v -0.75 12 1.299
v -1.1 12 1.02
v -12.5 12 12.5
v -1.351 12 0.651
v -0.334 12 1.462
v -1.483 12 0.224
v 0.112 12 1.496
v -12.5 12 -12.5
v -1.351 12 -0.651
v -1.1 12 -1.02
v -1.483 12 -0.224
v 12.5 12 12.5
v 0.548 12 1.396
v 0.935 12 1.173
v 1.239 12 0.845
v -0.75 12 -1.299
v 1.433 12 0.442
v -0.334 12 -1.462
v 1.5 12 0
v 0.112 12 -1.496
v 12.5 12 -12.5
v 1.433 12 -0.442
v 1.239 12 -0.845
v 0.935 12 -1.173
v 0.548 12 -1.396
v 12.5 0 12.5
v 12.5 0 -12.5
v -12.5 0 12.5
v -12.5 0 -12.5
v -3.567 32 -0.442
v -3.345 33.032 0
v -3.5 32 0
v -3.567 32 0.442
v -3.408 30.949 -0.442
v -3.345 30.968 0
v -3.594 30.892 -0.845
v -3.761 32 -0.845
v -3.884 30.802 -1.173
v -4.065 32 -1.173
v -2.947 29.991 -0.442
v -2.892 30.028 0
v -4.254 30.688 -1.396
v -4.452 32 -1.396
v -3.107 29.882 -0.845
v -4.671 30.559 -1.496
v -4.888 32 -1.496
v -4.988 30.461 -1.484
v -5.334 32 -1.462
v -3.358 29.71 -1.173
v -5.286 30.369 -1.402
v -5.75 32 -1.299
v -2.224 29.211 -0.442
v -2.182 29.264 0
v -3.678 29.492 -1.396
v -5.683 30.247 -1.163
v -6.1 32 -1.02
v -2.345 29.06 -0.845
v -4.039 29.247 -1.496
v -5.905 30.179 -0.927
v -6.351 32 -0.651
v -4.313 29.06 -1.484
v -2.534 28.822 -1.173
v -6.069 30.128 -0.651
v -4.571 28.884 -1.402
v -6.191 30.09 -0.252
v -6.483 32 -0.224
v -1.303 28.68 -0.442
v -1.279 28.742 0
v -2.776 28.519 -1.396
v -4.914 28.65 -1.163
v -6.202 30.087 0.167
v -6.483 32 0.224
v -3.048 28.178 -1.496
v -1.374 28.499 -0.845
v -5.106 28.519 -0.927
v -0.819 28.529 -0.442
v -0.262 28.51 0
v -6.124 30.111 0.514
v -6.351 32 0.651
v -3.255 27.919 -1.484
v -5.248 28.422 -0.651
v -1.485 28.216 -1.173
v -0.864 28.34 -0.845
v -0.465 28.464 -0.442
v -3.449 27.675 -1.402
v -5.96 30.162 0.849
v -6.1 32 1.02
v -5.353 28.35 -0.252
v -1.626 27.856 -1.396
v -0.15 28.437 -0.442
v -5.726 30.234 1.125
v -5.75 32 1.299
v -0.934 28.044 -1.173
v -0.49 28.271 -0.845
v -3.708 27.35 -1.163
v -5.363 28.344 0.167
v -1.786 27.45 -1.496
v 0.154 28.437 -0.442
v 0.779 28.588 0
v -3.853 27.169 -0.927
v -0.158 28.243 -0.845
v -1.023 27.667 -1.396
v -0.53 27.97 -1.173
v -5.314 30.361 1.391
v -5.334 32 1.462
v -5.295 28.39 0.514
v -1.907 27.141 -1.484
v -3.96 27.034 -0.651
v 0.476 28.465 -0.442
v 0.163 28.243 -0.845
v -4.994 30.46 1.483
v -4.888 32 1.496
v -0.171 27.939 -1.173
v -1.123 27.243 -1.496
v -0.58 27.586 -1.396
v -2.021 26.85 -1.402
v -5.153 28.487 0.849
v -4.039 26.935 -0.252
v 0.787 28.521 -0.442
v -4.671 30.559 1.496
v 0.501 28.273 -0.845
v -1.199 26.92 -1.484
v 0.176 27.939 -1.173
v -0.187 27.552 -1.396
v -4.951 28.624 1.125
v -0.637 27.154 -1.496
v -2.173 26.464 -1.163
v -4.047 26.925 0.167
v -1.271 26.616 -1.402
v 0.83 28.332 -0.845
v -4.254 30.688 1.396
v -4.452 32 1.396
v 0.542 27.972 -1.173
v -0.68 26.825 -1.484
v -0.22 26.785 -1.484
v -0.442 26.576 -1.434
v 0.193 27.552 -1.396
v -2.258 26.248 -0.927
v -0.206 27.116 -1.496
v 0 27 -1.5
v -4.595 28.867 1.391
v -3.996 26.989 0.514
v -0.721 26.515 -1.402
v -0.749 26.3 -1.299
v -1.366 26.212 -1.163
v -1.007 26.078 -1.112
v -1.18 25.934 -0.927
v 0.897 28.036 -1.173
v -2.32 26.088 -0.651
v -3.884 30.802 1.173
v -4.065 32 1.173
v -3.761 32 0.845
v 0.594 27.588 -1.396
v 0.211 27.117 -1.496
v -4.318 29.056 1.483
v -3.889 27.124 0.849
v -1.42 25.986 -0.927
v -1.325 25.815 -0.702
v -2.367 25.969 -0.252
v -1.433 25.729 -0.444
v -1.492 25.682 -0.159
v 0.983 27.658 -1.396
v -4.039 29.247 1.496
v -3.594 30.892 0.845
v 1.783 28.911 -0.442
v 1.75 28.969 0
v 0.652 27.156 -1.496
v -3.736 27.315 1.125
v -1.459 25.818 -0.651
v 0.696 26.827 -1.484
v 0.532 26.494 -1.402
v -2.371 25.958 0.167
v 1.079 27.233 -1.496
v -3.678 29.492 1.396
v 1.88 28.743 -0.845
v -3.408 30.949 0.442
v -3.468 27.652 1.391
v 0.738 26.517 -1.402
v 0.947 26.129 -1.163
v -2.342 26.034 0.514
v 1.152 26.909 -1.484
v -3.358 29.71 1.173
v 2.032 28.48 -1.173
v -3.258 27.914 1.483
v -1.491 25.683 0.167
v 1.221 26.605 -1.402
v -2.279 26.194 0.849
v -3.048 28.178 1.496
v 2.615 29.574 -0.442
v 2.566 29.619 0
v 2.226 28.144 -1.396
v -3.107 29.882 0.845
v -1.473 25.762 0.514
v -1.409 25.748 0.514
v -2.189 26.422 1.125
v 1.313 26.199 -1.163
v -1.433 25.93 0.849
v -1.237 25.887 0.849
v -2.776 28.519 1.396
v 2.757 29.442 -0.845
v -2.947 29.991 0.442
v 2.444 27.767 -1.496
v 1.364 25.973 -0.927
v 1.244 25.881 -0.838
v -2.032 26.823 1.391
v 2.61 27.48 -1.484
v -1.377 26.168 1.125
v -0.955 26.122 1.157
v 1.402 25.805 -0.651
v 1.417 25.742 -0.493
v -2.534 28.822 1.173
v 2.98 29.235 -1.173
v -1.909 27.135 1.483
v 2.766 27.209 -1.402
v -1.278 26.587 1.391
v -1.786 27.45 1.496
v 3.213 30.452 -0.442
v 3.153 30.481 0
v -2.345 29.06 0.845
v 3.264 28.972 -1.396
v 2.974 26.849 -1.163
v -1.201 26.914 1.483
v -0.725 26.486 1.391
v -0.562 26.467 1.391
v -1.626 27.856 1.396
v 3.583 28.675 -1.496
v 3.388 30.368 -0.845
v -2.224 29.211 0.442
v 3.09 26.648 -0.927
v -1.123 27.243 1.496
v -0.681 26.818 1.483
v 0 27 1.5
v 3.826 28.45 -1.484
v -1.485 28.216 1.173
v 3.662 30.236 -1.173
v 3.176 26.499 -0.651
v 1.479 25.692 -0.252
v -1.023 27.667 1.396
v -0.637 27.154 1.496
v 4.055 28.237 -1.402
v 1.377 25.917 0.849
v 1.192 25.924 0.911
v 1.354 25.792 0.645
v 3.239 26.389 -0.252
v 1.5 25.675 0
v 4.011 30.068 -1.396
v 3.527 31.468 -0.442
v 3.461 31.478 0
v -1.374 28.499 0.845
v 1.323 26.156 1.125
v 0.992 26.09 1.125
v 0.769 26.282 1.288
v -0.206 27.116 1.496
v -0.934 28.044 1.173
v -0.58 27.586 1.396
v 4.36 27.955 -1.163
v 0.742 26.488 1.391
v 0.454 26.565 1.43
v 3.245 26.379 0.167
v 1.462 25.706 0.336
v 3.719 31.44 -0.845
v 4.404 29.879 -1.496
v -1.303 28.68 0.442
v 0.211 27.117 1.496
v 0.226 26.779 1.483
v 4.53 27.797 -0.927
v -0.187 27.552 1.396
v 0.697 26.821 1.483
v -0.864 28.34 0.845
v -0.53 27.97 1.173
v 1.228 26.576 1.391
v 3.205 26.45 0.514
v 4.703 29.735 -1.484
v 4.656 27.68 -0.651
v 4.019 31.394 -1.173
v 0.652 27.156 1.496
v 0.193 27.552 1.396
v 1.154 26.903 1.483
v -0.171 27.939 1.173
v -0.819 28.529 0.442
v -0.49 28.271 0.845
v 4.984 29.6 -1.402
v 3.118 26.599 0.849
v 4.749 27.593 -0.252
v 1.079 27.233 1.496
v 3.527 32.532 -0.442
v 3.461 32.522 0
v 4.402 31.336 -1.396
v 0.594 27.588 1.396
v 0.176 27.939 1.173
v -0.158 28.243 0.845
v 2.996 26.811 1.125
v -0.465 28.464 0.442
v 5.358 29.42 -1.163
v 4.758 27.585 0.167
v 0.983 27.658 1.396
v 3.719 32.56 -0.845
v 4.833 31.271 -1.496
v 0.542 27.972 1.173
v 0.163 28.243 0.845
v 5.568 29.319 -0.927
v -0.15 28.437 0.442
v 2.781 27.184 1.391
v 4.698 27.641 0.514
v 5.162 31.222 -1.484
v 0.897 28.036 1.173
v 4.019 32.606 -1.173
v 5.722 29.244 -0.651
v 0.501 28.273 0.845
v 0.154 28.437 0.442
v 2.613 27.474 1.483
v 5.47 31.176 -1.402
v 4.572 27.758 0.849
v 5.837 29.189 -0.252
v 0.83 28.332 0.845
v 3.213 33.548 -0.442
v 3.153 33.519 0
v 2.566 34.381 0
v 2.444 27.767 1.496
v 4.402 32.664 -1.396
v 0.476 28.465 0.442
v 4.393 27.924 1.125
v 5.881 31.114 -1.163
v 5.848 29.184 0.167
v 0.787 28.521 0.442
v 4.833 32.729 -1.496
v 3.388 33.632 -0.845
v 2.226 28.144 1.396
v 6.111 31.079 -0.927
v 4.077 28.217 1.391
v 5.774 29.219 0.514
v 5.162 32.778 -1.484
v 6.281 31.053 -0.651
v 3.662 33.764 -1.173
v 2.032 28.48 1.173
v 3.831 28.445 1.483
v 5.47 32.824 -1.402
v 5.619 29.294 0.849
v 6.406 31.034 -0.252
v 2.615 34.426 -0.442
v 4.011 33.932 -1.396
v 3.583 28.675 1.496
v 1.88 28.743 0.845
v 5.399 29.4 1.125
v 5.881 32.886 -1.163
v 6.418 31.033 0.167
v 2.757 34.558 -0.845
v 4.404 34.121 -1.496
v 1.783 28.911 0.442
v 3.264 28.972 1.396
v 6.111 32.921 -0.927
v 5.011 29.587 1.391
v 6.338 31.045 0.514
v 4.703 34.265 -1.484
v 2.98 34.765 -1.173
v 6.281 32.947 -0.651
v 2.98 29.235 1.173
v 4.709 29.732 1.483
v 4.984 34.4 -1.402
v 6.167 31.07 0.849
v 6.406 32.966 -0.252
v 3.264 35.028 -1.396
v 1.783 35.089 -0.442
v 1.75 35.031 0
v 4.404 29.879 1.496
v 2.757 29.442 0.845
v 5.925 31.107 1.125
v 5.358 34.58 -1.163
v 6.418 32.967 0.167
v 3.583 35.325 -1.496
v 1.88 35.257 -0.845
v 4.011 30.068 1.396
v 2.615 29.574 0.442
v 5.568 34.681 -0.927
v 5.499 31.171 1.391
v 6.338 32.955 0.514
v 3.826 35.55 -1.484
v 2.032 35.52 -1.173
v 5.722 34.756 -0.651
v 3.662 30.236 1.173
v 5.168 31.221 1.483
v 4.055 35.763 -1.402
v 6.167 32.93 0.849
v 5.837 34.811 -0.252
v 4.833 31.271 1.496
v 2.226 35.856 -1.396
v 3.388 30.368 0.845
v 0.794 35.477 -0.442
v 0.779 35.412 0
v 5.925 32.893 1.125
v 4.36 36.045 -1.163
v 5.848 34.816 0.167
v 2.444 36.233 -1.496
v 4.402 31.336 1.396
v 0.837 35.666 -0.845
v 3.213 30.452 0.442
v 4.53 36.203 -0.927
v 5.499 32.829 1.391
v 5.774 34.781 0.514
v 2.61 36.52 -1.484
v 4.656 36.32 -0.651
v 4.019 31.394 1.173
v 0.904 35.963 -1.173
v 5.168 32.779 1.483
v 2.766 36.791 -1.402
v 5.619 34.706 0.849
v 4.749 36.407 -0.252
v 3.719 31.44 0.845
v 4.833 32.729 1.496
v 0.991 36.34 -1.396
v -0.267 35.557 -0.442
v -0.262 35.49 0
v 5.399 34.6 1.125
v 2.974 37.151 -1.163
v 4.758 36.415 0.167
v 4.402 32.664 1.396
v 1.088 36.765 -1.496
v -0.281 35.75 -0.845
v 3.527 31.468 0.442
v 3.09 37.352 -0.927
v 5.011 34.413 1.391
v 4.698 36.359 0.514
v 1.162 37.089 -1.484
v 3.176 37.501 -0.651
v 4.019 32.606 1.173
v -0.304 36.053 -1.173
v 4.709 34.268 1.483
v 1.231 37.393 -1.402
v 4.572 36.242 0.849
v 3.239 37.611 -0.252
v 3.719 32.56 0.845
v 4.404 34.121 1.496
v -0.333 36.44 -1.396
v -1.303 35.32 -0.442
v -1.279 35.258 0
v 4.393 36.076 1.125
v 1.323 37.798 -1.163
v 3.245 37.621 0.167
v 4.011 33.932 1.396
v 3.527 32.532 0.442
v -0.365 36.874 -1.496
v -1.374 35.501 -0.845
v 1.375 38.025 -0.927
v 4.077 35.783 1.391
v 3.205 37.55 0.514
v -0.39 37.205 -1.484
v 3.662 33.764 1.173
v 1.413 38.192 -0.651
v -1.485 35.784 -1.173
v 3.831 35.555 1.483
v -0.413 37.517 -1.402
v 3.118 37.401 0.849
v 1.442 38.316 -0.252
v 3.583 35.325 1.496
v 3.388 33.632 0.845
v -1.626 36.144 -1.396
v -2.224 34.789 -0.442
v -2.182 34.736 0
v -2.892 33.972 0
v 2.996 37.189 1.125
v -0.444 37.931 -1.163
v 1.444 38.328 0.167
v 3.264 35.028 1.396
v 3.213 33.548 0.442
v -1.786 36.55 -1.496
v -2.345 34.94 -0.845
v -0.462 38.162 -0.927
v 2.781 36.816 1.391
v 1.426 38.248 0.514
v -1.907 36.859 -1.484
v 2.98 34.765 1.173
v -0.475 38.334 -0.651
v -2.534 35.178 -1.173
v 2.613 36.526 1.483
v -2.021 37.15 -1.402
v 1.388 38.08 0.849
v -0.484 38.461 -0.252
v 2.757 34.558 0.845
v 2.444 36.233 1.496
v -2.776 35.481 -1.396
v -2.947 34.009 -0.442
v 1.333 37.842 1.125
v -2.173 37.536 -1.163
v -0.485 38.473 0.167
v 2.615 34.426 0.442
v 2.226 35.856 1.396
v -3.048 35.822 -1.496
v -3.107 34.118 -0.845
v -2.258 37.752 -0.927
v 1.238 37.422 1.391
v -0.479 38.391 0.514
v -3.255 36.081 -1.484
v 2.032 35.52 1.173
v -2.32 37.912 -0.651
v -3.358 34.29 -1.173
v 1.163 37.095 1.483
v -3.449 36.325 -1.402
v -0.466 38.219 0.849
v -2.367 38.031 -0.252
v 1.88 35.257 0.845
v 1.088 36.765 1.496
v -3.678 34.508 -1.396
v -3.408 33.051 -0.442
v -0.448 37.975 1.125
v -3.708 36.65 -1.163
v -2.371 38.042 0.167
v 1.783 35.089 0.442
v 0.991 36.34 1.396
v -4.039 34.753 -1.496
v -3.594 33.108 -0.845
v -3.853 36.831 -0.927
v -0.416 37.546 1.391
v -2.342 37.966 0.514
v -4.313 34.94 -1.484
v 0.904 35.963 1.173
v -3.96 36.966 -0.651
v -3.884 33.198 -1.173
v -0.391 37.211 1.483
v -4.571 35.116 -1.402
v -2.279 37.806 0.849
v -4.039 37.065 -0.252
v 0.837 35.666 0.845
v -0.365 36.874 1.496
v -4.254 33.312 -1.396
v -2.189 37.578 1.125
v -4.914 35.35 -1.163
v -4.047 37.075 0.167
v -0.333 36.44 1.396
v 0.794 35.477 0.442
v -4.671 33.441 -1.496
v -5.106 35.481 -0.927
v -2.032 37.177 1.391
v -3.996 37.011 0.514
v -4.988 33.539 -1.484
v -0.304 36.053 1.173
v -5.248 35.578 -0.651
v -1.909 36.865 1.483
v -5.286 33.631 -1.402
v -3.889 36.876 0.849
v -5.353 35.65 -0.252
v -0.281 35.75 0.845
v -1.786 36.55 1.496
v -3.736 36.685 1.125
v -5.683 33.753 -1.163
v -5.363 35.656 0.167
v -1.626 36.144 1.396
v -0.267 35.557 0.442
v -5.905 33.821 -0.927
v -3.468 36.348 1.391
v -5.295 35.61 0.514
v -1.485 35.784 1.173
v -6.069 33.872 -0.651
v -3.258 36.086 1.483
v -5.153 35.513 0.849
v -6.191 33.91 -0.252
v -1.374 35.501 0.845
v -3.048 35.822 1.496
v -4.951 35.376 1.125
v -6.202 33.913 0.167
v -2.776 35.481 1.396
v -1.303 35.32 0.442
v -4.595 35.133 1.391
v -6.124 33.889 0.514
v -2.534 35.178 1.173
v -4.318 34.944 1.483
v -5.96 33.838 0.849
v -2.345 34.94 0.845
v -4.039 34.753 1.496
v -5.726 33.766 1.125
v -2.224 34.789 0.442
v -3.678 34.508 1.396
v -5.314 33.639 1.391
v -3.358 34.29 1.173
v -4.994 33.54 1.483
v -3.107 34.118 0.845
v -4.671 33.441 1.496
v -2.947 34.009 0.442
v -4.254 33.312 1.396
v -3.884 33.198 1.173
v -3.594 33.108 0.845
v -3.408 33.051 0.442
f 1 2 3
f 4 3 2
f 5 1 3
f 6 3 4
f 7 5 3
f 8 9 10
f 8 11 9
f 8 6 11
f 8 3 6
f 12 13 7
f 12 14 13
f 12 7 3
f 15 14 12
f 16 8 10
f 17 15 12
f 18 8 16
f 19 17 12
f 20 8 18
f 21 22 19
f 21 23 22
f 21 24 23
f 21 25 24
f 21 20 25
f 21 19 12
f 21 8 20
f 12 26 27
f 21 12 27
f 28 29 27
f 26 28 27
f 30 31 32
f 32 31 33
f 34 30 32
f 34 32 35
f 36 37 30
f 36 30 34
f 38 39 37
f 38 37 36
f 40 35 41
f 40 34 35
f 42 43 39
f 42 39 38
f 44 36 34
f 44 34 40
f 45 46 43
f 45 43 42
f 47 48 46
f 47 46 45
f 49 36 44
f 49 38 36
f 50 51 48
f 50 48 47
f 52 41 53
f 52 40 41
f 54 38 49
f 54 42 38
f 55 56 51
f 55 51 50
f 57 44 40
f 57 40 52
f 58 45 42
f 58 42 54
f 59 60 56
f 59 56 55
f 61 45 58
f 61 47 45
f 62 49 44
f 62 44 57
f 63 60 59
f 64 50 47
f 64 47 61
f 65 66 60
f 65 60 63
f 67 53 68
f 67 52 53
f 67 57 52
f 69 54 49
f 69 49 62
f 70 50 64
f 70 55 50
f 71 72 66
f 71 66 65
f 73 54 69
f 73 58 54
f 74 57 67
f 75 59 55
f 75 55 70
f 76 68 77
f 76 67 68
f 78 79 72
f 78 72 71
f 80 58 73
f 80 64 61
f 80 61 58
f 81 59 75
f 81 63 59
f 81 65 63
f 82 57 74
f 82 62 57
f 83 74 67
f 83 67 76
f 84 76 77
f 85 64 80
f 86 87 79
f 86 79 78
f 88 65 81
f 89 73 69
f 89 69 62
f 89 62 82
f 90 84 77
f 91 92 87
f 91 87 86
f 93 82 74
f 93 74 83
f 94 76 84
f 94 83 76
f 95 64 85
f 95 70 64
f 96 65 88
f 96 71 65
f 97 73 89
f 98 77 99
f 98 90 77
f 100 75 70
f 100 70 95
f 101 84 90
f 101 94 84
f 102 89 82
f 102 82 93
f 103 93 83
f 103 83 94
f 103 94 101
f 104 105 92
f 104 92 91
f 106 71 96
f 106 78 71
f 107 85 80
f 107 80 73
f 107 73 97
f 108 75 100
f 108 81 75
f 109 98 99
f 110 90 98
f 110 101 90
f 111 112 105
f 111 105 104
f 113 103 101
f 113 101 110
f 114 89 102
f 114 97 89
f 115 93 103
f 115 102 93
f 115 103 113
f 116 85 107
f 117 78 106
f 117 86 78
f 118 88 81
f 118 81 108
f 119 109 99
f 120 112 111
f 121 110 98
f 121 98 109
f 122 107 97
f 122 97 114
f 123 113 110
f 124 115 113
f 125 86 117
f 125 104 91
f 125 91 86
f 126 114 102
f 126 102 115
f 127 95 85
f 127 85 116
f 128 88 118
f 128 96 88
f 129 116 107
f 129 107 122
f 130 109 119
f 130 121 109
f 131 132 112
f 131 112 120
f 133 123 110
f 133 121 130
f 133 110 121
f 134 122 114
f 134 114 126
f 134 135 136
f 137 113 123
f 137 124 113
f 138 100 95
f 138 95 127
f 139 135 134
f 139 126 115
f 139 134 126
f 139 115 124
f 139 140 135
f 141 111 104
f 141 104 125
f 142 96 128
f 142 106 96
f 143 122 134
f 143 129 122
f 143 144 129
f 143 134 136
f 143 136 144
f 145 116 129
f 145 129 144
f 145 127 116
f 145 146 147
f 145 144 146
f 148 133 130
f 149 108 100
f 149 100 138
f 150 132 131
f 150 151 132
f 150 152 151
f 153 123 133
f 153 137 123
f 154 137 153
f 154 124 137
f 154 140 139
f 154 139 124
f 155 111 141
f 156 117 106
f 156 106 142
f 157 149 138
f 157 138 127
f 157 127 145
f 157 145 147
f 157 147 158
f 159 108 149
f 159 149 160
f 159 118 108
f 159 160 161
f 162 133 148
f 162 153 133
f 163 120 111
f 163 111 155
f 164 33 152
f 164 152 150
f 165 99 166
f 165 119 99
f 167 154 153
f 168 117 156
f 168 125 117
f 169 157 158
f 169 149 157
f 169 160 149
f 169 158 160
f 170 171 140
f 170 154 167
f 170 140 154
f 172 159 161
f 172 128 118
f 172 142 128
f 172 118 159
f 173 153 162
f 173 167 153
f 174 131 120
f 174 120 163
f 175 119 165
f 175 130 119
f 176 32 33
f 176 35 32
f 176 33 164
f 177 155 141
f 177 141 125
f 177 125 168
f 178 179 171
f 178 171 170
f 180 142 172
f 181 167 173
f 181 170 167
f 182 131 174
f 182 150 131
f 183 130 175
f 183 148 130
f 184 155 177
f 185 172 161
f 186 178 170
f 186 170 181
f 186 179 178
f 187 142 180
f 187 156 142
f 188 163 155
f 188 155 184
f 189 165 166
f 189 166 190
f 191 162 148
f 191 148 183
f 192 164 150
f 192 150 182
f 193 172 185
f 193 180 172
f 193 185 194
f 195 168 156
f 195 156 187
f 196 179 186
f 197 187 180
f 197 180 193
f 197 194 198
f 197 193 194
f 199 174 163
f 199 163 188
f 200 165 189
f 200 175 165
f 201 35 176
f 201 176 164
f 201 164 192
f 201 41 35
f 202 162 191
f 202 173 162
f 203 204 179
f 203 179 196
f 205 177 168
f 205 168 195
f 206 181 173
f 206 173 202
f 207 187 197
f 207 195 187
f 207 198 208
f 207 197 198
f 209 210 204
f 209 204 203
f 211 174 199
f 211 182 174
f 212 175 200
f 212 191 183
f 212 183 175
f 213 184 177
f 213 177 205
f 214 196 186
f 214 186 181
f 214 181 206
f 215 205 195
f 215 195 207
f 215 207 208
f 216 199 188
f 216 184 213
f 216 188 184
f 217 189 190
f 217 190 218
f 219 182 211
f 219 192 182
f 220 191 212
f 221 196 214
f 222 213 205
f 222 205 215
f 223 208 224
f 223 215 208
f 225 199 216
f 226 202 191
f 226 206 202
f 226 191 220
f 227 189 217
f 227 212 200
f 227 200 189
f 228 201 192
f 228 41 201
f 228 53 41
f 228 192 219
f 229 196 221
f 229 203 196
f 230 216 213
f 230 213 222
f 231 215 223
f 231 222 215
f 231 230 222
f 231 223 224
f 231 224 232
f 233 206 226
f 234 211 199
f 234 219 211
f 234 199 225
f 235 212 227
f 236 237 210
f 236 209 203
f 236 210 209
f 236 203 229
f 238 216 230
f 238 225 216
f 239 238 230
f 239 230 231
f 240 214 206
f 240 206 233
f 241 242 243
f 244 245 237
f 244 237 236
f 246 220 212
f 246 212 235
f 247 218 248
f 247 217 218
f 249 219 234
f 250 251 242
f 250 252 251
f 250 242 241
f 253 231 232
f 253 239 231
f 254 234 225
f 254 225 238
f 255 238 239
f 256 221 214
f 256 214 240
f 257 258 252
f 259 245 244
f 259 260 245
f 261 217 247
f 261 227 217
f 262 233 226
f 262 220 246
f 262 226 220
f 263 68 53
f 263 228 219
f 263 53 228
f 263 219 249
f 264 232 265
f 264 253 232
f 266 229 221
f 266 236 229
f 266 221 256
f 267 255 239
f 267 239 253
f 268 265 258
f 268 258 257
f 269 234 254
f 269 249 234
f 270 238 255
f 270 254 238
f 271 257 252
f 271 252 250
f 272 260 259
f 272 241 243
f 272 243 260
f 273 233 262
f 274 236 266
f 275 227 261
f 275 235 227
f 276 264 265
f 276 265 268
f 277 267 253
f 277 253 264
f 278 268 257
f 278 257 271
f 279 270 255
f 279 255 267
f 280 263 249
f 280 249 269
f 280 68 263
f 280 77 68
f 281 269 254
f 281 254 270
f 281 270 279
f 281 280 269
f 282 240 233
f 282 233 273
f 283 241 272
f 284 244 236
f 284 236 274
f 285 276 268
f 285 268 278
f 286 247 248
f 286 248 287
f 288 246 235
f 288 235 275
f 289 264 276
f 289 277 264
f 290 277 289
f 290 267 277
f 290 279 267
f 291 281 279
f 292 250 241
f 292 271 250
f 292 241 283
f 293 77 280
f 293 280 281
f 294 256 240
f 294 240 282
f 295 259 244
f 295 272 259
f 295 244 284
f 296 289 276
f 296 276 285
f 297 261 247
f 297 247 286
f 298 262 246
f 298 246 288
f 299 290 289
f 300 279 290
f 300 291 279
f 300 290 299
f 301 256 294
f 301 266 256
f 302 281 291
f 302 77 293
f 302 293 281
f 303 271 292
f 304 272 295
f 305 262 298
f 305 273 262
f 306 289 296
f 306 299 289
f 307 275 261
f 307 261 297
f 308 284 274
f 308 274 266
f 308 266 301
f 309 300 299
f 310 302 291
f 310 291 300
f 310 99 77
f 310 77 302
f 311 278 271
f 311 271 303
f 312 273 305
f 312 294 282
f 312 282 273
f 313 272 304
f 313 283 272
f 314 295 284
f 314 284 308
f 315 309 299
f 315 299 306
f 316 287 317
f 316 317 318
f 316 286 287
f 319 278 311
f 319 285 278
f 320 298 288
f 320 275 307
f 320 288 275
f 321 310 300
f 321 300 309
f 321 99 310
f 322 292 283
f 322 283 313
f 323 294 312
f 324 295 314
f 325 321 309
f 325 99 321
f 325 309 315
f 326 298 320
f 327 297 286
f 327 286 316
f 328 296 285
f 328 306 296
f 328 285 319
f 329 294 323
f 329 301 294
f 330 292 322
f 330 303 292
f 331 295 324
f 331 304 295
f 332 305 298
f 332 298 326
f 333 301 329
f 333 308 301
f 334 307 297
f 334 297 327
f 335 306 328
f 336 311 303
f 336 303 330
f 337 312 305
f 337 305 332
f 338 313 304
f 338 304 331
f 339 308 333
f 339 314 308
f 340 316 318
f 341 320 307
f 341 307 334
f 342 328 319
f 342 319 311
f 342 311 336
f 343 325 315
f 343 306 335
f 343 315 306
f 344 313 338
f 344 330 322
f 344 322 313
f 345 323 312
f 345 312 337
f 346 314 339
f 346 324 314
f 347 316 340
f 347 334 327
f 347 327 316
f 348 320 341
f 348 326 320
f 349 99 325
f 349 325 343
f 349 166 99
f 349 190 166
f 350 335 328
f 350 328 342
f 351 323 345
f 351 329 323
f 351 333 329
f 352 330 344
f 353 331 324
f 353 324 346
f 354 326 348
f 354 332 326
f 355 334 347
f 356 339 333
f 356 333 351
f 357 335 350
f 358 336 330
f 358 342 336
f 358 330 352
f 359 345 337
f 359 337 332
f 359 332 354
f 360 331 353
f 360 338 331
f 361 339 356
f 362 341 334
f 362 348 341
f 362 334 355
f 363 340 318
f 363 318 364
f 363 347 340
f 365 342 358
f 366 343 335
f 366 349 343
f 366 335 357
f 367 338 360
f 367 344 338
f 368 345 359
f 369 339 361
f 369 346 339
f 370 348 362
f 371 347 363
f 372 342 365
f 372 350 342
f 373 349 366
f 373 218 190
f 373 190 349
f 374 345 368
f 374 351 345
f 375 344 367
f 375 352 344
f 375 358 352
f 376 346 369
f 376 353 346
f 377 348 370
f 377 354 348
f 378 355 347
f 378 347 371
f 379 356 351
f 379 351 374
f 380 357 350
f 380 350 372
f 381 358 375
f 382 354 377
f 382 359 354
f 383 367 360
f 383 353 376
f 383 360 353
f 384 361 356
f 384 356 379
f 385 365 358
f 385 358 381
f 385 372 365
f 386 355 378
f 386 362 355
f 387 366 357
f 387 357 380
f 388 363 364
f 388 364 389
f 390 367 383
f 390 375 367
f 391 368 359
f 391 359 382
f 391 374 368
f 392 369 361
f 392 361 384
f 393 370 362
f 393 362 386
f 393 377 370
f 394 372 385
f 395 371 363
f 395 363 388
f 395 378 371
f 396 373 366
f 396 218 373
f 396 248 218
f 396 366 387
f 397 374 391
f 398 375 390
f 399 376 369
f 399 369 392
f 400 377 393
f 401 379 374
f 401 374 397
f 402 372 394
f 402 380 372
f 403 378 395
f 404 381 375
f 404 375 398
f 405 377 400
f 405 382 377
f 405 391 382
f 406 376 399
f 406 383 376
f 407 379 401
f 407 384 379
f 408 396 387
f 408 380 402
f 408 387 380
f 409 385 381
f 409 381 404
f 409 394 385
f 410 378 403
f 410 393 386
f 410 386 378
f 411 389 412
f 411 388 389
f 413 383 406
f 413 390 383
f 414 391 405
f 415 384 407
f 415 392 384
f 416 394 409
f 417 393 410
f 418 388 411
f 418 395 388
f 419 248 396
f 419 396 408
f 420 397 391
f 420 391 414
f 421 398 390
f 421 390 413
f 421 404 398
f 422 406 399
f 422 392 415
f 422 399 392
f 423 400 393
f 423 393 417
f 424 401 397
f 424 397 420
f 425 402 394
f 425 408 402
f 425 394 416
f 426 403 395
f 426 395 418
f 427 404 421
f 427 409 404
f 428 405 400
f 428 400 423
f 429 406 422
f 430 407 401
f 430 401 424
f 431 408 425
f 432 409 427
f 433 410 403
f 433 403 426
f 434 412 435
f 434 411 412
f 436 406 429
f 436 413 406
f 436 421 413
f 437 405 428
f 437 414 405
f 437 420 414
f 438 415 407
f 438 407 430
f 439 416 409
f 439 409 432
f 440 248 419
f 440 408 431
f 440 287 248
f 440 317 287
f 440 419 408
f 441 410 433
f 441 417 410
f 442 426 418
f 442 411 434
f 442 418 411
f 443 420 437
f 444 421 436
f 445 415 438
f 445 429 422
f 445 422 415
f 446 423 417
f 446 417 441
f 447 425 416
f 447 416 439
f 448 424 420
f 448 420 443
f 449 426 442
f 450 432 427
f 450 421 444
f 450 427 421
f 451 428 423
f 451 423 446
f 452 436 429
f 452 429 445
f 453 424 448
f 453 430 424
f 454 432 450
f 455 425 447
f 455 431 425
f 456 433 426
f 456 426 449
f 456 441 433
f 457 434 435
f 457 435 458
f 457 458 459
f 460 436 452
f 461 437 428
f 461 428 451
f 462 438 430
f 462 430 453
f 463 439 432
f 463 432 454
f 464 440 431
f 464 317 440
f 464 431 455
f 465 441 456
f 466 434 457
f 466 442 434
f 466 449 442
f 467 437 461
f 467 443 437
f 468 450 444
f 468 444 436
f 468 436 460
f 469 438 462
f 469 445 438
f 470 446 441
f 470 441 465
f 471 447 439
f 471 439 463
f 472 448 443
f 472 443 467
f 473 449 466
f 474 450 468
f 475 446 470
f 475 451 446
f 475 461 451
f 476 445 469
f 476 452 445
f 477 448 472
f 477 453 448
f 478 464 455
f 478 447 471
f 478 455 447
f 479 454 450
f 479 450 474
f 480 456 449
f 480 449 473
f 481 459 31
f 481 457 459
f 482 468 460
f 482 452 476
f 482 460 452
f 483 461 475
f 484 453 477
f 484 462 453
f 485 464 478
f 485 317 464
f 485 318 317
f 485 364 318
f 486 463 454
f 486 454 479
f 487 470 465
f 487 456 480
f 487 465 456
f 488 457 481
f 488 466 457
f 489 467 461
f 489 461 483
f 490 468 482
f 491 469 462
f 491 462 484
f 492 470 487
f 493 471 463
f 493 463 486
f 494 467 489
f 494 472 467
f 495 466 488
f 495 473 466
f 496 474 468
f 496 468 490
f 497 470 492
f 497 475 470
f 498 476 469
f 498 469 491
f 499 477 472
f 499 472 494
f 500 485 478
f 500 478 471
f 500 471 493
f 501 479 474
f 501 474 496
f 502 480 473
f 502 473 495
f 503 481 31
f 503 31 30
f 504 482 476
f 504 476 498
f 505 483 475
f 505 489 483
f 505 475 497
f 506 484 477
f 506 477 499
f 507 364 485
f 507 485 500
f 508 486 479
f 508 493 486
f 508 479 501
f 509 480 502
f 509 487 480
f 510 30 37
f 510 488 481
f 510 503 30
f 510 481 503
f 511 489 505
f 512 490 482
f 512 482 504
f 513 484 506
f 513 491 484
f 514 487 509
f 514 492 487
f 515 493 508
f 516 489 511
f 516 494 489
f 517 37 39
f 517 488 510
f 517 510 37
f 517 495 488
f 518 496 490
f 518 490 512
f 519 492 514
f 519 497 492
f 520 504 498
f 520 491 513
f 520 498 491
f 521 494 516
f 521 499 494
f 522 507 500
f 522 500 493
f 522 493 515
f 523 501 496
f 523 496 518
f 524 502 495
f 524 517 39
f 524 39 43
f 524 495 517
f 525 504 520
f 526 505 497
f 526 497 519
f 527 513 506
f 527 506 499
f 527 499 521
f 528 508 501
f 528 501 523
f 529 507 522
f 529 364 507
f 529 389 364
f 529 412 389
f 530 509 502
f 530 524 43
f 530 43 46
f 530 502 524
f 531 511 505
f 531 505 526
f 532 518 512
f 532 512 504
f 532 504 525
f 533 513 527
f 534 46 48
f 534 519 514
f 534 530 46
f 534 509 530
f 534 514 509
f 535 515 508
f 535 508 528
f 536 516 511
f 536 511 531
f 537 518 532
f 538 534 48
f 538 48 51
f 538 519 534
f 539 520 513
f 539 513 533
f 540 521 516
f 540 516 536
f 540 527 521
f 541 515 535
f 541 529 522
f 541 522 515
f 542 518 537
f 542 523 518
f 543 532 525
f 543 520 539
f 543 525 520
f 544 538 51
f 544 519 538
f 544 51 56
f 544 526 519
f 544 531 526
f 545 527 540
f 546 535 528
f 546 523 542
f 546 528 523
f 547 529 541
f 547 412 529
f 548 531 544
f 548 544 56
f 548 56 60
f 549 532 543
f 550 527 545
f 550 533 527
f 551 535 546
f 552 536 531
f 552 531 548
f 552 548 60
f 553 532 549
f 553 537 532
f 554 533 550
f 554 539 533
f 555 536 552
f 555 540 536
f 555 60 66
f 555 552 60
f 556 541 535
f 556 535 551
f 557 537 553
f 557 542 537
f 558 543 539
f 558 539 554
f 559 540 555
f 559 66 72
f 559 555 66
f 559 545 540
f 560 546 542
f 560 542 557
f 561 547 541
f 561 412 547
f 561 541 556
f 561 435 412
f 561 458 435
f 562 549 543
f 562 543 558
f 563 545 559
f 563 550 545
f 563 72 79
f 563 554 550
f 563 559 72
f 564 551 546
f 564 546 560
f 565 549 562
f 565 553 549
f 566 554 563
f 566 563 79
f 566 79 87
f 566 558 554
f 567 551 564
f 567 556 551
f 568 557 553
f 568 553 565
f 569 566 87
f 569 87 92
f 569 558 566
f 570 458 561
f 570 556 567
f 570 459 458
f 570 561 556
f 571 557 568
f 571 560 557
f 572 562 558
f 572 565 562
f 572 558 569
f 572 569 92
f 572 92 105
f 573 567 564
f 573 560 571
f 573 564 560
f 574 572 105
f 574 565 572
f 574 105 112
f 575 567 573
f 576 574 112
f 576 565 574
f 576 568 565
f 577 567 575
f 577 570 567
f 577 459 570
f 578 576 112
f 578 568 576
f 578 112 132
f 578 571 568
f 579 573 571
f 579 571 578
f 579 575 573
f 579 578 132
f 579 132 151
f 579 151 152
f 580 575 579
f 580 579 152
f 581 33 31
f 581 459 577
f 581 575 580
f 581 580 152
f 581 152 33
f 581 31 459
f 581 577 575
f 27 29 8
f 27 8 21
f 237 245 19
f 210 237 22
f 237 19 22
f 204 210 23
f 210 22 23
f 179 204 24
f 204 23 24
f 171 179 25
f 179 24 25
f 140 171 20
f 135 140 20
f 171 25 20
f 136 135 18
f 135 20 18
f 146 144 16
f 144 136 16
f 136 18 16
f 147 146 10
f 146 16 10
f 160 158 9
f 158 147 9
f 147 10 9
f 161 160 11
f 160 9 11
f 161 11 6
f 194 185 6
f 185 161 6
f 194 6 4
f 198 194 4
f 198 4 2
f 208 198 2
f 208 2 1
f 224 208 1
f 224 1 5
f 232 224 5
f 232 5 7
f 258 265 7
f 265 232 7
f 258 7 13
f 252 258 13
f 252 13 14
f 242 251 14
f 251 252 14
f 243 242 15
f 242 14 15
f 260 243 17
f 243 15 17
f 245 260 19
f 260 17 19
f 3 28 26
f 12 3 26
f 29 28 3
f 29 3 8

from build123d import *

# Parameters (mm, degrees)
SKETCH1_W           = 25
SKETCH1_H           = 25
BOSS_EXTRUDE1_DEPTH = 12
SKETCH2_R           = 1.5
BOSS_EXTRUDE2_DEPTH = 15
SKETCH3_R           = 1.5


with BuildPart() as part:
    # Sketch1 → Boss-Extrude1 (new body)
    with BuildSketch(Plane(origin=(0, 0, 0), x_dir=(1, 0, 0), z_dir=(0, 1, 0))):
        Rectangle(SKETCH1_W, SKETCH1_H)
    extrude(amount=BOSS_EXTRUDE1_DEPTH)

    # Sketch2 → Boss-Extrude2 (add)
    with BuildSketch(Plane(origin=(0, 12, 0), x_dir=(1, 0, 0), z_dir=(0, 1, 0))):
        Circle(SKETCH2_R)
    extrude(amount=BOSS_EXTRUDE2_DEPTH)

    # Sketch3 → Revolve1 (revolve)
    with BuildSketch(Plane(origin=(0, 31.999999906, 0), x_dir=(1, 0, 0), z_dir=(0, 1, 0))):
        with Locations((-5, 0)):
            Circle(SKETCH3_R)
    revolve(axis=Axis((0, 31.999999906, -13.75), (0, 0, 1)))


solid = part.part
